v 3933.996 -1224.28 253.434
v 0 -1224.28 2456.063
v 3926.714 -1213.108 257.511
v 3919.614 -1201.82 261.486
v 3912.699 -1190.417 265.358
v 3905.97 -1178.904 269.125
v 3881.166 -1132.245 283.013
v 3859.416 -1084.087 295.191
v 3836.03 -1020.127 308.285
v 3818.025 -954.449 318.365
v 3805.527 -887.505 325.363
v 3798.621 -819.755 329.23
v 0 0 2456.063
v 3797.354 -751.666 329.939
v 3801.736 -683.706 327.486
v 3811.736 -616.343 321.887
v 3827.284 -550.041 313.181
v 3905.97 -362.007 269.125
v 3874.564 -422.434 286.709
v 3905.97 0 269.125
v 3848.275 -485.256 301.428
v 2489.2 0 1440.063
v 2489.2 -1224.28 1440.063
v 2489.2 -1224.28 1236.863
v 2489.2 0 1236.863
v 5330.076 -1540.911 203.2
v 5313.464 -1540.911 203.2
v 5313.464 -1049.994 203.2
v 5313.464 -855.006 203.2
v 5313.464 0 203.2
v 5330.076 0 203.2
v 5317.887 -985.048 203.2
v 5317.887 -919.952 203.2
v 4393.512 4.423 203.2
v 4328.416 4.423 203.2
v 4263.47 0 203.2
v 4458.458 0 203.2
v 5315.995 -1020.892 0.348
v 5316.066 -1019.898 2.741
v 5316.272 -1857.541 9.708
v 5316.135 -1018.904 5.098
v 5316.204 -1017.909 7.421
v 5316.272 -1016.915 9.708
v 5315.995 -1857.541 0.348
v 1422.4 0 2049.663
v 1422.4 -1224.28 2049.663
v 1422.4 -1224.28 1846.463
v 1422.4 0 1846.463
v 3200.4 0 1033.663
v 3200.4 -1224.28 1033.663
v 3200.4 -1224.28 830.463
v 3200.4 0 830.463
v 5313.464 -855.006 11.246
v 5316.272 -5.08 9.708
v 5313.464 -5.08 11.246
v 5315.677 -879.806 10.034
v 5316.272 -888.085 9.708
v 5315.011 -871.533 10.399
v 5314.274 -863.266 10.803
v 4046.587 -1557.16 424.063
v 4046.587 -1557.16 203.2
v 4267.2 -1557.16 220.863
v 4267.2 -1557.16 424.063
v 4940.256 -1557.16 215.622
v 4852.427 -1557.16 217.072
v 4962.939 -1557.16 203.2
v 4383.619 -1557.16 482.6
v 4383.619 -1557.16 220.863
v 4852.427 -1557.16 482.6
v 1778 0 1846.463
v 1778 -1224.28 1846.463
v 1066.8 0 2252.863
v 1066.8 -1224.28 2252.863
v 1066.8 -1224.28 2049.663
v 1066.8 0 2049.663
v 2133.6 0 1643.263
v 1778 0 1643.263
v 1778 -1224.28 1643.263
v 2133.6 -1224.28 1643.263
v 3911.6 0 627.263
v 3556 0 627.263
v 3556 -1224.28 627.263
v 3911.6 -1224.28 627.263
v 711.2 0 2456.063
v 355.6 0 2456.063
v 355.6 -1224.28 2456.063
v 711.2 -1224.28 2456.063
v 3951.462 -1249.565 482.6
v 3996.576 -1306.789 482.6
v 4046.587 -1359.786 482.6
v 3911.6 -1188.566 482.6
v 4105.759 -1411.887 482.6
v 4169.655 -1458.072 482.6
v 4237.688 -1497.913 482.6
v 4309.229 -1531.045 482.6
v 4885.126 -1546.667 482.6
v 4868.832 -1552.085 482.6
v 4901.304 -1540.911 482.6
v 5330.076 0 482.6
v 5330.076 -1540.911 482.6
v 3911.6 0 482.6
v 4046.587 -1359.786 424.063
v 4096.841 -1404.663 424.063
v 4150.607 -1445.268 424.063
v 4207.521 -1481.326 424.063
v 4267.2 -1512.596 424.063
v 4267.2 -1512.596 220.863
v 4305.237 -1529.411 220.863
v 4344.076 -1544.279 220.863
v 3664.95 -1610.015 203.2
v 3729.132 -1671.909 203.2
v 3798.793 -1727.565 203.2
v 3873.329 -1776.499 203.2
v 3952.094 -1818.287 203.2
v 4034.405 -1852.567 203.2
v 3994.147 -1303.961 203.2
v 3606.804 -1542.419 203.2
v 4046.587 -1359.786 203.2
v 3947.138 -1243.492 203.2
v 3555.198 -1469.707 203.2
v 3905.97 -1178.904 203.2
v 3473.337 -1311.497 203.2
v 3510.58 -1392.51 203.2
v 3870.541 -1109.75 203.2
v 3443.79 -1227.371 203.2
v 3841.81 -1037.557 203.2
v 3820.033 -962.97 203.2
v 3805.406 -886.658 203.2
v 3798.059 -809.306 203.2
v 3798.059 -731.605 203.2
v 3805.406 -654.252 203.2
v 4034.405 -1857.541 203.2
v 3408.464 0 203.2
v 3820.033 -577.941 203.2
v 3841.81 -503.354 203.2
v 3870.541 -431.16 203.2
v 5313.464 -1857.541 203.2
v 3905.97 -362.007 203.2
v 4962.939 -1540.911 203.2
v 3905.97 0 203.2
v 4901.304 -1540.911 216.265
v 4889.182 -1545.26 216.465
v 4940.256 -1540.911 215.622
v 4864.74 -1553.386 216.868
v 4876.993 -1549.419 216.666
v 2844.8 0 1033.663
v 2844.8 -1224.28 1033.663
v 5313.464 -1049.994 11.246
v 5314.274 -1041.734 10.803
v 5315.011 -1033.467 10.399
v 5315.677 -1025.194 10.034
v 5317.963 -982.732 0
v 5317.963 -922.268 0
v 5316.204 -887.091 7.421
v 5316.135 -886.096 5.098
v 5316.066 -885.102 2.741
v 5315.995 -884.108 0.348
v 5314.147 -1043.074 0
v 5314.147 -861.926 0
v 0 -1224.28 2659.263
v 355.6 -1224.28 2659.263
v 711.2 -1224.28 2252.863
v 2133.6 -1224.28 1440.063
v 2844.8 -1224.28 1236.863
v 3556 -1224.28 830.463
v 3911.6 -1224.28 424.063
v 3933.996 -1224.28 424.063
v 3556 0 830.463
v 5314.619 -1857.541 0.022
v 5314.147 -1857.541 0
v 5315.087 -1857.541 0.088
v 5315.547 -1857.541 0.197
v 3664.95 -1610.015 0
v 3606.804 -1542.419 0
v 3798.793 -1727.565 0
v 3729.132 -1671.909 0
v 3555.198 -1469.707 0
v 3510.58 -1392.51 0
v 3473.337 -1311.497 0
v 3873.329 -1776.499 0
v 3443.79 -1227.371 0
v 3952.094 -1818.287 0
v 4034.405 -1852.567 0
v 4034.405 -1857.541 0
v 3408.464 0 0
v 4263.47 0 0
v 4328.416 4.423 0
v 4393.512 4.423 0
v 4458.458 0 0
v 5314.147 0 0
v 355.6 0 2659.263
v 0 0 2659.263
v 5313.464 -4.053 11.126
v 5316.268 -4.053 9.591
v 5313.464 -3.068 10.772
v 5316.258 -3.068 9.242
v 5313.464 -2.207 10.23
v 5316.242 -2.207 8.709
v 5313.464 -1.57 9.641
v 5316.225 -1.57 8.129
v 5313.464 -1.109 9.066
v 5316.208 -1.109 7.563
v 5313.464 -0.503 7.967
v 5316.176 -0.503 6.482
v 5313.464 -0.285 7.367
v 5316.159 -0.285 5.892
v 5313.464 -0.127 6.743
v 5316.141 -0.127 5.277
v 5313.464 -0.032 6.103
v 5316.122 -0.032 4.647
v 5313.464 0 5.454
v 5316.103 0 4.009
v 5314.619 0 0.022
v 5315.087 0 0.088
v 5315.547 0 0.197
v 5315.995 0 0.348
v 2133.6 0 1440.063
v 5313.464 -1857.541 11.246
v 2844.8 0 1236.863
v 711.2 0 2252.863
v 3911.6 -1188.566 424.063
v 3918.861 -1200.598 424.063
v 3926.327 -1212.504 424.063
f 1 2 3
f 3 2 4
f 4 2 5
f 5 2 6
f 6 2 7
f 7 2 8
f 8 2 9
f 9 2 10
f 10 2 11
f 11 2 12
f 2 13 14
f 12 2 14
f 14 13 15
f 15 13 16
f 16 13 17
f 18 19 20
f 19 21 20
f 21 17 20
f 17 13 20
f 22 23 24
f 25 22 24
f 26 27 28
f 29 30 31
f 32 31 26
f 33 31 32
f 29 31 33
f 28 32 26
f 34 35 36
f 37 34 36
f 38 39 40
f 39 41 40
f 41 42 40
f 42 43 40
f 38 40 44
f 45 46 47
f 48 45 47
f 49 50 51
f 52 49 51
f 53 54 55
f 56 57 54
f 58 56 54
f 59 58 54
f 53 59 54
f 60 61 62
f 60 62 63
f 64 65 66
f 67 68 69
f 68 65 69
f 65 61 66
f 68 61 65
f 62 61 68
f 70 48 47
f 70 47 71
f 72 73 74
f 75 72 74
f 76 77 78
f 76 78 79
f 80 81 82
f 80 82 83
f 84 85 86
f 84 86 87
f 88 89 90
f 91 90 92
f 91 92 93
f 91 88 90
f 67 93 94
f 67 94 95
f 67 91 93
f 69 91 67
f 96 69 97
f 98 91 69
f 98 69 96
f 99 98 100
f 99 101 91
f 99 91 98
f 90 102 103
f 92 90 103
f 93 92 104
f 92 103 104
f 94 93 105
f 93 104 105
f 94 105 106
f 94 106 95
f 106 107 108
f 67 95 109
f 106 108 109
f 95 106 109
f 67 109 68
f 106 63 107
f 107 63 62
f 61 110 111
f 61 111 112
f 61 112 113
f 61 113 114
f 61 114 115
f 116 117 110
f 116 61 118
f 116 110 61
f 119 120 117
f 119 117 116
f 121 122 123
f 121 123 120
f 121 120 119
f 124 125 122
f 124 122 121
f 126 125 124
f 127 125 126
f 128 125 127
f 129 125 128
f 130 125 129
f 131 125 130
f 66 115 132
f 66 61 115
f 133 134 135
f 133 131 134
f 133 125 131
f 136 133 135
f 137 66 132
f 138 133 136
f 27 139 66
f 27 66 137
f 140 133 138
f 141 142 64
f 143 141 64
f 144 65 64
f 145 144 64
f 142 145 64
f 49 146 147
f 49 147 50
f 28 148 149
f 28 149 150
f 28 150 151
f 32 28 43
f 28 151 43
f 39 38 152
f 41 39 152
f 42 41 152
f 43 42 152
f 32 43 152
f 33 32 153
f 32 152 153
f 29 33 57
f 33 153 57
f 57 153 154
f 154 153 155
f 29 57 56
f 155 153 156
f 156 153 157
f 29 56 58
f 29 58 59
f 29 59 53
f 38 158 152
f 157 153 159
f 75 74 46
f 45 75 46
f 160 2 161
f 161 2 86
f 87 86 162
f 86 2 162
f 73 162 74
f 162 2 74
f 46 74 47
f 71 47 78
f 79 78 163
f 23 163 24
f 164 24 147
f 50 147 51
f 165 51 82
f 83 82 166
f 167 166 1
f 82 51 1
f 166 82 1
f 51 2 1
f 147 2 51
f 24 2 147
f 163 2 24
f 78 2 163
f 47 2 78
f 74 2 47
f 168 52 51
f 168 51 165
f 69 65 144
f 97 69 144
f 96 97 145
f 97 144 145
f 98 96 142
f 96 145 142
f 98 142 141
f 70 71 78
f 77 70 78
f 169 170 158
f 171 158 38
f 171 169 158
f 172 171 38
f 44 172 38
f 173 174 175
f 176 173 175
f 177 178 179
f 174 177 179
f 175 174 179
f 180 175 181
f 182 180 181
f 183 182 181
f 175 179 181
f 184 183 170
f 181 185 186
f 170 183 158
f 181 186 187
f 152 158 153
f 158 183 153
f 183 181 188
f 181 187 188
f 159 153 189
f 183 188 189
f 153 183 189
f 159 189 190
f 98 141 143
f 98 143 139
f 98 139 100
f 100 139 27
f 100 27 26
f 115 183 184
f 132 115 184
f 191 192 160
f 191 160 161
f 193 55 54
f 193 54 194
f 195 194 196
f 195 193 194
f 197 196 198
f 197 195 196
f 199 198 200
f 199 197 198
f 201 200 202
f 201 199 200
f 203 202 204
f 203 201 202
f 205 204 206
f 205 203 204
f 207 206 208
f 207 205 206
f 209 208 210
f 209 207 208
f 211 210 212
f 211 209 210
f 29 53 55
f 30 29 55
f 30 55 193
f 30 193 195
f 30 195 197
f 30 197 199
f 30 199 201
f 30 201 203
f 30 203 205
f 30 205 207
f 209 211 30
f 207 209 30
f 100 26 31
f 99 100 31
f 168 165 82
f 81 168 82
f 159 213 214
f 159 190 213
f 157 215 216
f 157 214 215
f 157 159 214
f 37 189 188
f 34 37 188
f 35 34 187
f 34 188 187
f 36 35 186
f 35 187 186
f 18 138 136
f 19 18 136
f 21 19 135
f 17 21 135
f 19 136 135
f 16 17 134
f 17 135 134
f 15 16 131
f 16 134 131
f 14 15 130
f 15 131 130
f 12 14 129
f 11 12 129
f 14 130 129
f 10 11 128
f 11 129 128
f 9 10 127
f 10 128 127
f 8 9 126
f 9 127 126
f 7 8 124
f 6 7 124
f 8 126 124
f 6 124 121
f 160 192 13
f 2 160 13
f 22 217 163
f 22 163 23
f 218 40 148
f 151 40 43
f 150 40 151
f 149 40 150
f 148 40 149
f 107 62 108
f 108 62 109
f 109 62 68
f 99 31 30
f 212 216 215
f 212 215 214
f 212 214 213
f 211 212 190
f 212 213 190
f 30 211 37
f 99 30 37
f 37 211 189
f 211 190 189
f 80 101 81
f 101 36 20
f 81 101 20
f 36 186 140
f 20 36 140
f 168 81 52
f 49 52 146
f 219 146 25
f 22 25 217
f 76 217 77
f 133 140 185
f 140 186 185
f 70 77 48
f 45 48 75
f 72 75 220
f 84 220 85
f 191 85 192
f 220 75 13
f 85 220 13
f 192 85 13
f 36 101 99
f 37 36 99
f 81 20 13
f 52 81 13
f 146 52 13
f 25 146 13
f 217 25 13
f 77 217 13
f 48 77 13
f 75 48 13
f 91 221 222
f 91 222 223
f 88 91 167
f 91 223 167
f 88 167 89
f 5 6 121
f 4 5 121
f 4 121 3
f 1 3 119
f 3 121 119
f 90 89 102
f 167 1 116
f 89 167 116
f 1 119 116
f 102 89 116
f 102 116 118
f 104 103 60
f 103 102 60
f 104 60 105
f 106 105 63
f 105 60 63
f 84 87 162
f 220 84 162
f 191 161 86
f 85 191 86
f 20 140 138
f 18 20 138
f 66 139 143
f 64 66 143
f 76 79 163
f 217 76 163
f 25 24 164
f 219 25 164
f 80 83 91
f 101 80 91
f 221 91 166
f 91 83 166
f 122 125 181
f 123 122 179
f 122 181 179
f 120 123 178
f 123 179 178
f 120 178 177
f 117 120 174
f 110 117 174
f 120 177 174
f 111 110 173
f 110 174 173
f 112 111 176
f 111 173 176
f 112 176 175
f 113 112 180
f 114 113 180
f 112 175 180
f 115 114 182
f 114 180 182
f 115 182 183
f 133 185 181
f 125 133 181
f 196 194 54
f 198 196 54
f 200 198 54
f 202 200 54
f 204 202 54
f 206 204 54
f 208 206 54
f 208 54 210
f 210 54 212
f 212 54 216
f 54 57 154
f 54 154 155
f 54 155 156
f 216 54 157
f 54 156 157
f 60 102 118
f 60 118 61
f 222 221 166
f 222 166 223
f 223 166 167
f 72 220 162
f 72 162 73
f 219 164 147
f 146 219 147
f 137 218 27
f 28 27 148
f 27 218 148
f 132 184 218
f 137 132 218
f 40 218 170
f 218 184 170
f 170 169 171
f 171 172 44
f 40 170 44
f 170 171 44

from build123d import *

# Parameters (mm, degrees)
F1_DEPTH  = 3810
F2_R      = 5.08
F4_W      = 4046.5870756649
F4_H      = 2585.72
F5_DEPTH  = 3454.4
F7_DEPTH  = 4292.6
F9_DEPTH  = 5537.2
F11_DEPTH = 203.2
F12_W     = 1461.0528945923
F12_H     = 2088.3071422577
F13_DEPTH = 1066.8
F15_DEPTH = 279.4
F16_W     = 422.590970993
F16_H     = 310.923916626
F17_DEPTH = 3728.72


with BuildPart() as f1:
    # F0 (on Front) → F1 (new body)
    with BuildSketch(Plane.XZ):
        Polygon((0, 2921), (0, 0), (5334, 0), align=None)
    extrude(amount=F1_DEPTH)

    # F2
    f2_edges = [f1.edges().sort_by_distance(p)[0] for p in [
        (5334, -1905, 0),
        (0, -1905, 2921),
        (2667, 0, 1460.5),
        (2667, -3810, 1460.5),
    ]]
    fillet(f2_edges, radius=F2_R)

    # F4 (on face) → F5 (cut)
    with BuildSketch(Plane(origin=(0, 0, 0), x_dir=(1, 0, 0), z_dir=(0, 0, -1))):
        with Locations((2023.2935378325, 2517.14)):
            Rectangle(F4_W, F4_H)
    extrude(amount=-F5_DEPTH, mode=Mode.SUBTRACT)

    # F6 (on face) → F7 (cut)
    with BuildSketch(Plane.XZ.offset(3810)):
        Polygon((5320.9031862571, 17.6625038147), (5320.9031862571, 166.5061565368), (5316.5761081827, 20.0202453923), align=None)
        Polygon((5320.9031862571, 17.6625038147), (5316.5761081827, 20.0202453923), (5316.5064623594, 17.6625038147), align=None)
        Polygon((0.5696018103, 2659.2625038147), (355.6, 2659.2625038147), (355.6, 2456.0625038147), (711.2, 2456.0625038147), (711.2, 2252.8625038147), (1066.8, 2252.8625038147), (1066.8, 2049.6625038147), (1422.4, 2049.6625038147), (1422.4, 1846.4625038147), (1778, 1846.4625038147), (1778, 1643.2625038147), (2133.6, 1643.2625038147), (2133.6, 1440.0625038147), (2489.2, 1440.0625038147), (2489.2, 1236.8625038147), (2844.8, 1236.8625038147), (2844.8, 1033.6625038147), (2853.4424130303, 1033.6625038147), (2855.7144169309, 1351.3645521511), (0.6243509594, 2914.8662549451), align=None)
        Polygon((3665.5870756649, 907.8628580825), (2855.7144169309, 1351.3645521511), (2853.4424130303, 1033.6625038147), (3200.4, 1033.6625038147), (3200.4, 830.4625038147), (3556, 830.4625038147), (3556, 627.2625038147), (3665.5870756649, 627.2625038147), align=None)
        Polygon((2856.9627382478, 1525.9215761281), (2855.7144169309, 1351.3645521511), (3665.5870756649, 907.8628580825), (3665.5870756649, 627.2625038147), (3911.6, 627.2625038147), (3911.6, 424.0625038147), (4267.2, 424.0625038147), (4267.2, 220.8625038147), (4622.8, 220.8625038147), (4958.1376933021, 215.3264403), (5316.5761081827, 20.0202453923), (5320.9031862571, 166.5061565368), align=None)
        Polygon((0, 2659.2625038147), (0.5696018103, 2659.2625038147), (0.6243509594, 2914.8662549451), (2855.7144169309, 1351.3645521511), (2856.9627382478, 1525.9215761281), (0, 3038.5632514954), (-325.4196941853, 3048.7372875214), (-325.4196941853, 166.5061565368), (-325.4196941853, -137.8409564495), (5320.9031862571, -137.8409564495), (5320.9031862571, 17.6625038147), (5316.5064623594, 17.6625038147), (5315.9847259521, 0), (3665.5870756649, 0), (2846.1766242981, 0), (0, 0), (0, 2456.0625038147), align=None)
    extrude(amount=-F7_DEPTH, mode=Mode.SUBTRACT)

    # F8 (on face) → F9 (cut)
    with BuildSketch(Plane(origin=(0, 0, 0), x_dir=(-1, 0, 0), z_dir=(0, 1, 0))):
        Polygon((-4386.6400718689, 0), (0, 0), (0, 2456.0625038147), align=None)
    extrude(amount=-F9_DEPTH, mode=Mode.SUBTRACT)

    # F10 (on Top) → F11 (join)
    with BuildSketch(Plane.XY):
        with BuildLine():
            Line((5313.4641647339, -855.0057024642), (5313.4641647339, 0))
            Line((5313.4641647339, 0), (4458.4584622696, 0))
            Line((4458.4584622696, 0), (4263.4698671981, 0))
            Line((4263.4698671981, 0), (3408.4641647339, 0))
            Line((3408.4641647339, 0), (3443.7904647341, -1227.3705005646))
            Line((3443.7904647341, -1227.3705005646), (4034.4052314758, -1227.3705005646))
            Line((4034.4052314758, -1227.3705005646), (4034.4052314758, -1852.5670259271))
            ThreePointArc((4034.4052314758, -1852.5670259271), (4147.3229003929, -1885.8374514198), (4263.4698671981, -1905))
            Line((4263.4698671981, -1905), (4458.4584622696, -1905))
            Line((4458.4584622696, -1905), (5313.4641647339, -1905))
            Line((5313.4641647339, -1905), (5313.4641647339, -1049.9942975358))
            Line((5313.4641647339, -1049.9942975358), (5313.4641647339, -855.0057024642))
        make_face()
        with BuildLine():
            Line((4263.4698671981, 0), (4458.4584622696, 0))
            ThreePointArc((4458.4584622696, 0), (4360.9641647339, 4.9765731087), (4263.4698671981, 0))
        make_face()
        with BuildLine():
            ThreePointArc((5313.4641647339, -1049.9942975358), (5318.4407378426, -952.5), (5313.4641647339, -855.0057024642))
            Line((5313.4641647339, -855.0057024642), (5313.4641647339, -1049.9942975358))
        make_face()
        with BuildLine():
            Line((4034.4052314758, -1227.3705005646), (3443.7904647341, -1227.3705005646))
            ThreePointArc((3443.7904647341, -1227.3705005646), (3664.9502355708, -1610.0150176711), (4034.4052314758, -1852.5670259271))
            Line((4034.4052314758, -1852.5670259271), (4034.4052314758, -1227.3705005646))
        make_face()
        with BuildLine():
            ThreePointArc((4263.4698671981, -1905), (4360.9641647339, -1909.9765731087), (4458.4584622696, -1905))
            Line((4458.4584622696, -1905), (4263.4698671981, -1905))
        make_face()
        with BuildLine():
            ThreePointArc((4263.4698671981, -1905), (4147.3229003929, -1885.8374514198), (4034.4052314758, -1852.5670259271))
            Line((4034.4052314758, -1852.5670259271), (4034.4052314758, -1905))
            Line((4034.4052314758, -1905), (4263.4698671981, -1905))
        make_face()
    extrude(amount=F11_DEPTH)

    # F12 (on Top) → F13 (cut)
    with BuildSketch(Plane.XY):
        with Locations((4715.0173187256, -2901.6946554184)):
            Rectangle(F12_W, F12_H)
    extrude(amount=F13_DEPTH, mode=Mode.SUBTRACT)

    # F14 (on face) → F15 (join)
    with BuildSketch(Plane.XY.offset(203.2)):
        with BuildLine():
            Line((5330.0757408142, -362.0066313751), (5330.0757408142, 0))
            Line((5330.0757408142, 0), (4901.3042104477, 0))
            ThreePointArc((4901.3042104477, 0), (5147.5837671775, -143.2273507594), (5330.0757408142, -362.0066313751))
        make_face()
        with BuildLine():
            Line((3905.9698581696, -1178.9039107697), (3905.9698581696, -362.0066313751))
            ThreePointArc((3905.9698581696, -362.0066313751), (3797.1393226717, -770.4552710724), (3905.9698581696, -1178.9039107697))
        make_face()
        with BuildLine():
            ThreePointArc((4023.7155692476, -204.1968507414), (4167.5069348944, -84.2445612592), (4334.7413885361, 0))
            Line((4334.7413885361, 0), (4023.7155692476, 0))
            Line((4023.7155692476, 0), (4023.7155692476, -204.1968507414))
        make_face()
        with BuildLine():
            Line((4023.7155692476, -204.1968507414), (4023.7155692476, 0))
            Line((4023.7155692476, 0), (3905.9698581696, 0))
            Line((3905.9698581696, 0), (3905.9698581696, -362.0066313751))
            ThreePointArc((3905.9698581696, -362.0066313751), (3960.0940752521, -279.558666545), (4023.7155692476, -204.1968507414))
        make_face()
        with BuildLine():
            ThreePointArc((5330.0757408142, -362.0066313751), (5147.5837671775, -143.2273507594), (4901.3042104477, 0))
            Line((4901.3042104477, 0), (4334.7413885361, 0))
            ThreePointArc((4334.7413885361, 0), (4167.5069348944, -84.2445612592), (4023.7155692476, -204.1968507414))
            Line((4023.7155692476, -204.1968507414), (4023.7155692476, -1224.28))
            Line((4023.7155692476, -1224.28), (4046.5870756649, -1224.28))
            Line((4046.5870756649, -1224.28), (4046.5870756649, -1359.7861594964))
            ThreePointArc((4046.5870756649, -1359.7861594964), (4447.847191651, -1573.5056711173), (4901.3042104477, -1540.9105421448))
            Line((4901.3042104477, -1540.9105421448), (5330.0757408142, -1540.9105421448))
            Line((5330.0757408142, -1540.9105421448), (5330.0757408142, -362.0066313751))
        make_face()
        with BuildLine():
            Line((4023.7155692476, -1224.28), (4023.7155692476, -204.1968507414))
            ThreePointArc((4023.7155692476, -204.1968507414), (3960.0940752521, -279.558666545), (3905.9698581696, -362.0066313751))
            Line((3905.9698581696, -362.0066313751), (3905.9698581696, -1178.9039107697))
            ThreePointArc((3905.9698581696, -1178.9039107697), (3969.9368596908, -1274.2749780595), (4046.5870756649, -1359.7861594964))
            Line((4046.5870756649, -1359.7861594964), (4046.5870756649, -1224.28))
            Line((4046.5870756649, -1224.28), (4023.7155692476, -1224.28))
        make_face()
    extrude(amount=F15_DEPTH)

    # F16 (on face) → F17 (cut)
    with BuildSketch(Plane.YZ.offset(5330.0757408142)):
        with Locations((-1768.4555053711, 358.661958313)):
            Rectangle(F16_W, F16_H)
    extrude(amount=-F17_DEPTH, mode=Mode.SUBTRACT)


solid = f1.part
